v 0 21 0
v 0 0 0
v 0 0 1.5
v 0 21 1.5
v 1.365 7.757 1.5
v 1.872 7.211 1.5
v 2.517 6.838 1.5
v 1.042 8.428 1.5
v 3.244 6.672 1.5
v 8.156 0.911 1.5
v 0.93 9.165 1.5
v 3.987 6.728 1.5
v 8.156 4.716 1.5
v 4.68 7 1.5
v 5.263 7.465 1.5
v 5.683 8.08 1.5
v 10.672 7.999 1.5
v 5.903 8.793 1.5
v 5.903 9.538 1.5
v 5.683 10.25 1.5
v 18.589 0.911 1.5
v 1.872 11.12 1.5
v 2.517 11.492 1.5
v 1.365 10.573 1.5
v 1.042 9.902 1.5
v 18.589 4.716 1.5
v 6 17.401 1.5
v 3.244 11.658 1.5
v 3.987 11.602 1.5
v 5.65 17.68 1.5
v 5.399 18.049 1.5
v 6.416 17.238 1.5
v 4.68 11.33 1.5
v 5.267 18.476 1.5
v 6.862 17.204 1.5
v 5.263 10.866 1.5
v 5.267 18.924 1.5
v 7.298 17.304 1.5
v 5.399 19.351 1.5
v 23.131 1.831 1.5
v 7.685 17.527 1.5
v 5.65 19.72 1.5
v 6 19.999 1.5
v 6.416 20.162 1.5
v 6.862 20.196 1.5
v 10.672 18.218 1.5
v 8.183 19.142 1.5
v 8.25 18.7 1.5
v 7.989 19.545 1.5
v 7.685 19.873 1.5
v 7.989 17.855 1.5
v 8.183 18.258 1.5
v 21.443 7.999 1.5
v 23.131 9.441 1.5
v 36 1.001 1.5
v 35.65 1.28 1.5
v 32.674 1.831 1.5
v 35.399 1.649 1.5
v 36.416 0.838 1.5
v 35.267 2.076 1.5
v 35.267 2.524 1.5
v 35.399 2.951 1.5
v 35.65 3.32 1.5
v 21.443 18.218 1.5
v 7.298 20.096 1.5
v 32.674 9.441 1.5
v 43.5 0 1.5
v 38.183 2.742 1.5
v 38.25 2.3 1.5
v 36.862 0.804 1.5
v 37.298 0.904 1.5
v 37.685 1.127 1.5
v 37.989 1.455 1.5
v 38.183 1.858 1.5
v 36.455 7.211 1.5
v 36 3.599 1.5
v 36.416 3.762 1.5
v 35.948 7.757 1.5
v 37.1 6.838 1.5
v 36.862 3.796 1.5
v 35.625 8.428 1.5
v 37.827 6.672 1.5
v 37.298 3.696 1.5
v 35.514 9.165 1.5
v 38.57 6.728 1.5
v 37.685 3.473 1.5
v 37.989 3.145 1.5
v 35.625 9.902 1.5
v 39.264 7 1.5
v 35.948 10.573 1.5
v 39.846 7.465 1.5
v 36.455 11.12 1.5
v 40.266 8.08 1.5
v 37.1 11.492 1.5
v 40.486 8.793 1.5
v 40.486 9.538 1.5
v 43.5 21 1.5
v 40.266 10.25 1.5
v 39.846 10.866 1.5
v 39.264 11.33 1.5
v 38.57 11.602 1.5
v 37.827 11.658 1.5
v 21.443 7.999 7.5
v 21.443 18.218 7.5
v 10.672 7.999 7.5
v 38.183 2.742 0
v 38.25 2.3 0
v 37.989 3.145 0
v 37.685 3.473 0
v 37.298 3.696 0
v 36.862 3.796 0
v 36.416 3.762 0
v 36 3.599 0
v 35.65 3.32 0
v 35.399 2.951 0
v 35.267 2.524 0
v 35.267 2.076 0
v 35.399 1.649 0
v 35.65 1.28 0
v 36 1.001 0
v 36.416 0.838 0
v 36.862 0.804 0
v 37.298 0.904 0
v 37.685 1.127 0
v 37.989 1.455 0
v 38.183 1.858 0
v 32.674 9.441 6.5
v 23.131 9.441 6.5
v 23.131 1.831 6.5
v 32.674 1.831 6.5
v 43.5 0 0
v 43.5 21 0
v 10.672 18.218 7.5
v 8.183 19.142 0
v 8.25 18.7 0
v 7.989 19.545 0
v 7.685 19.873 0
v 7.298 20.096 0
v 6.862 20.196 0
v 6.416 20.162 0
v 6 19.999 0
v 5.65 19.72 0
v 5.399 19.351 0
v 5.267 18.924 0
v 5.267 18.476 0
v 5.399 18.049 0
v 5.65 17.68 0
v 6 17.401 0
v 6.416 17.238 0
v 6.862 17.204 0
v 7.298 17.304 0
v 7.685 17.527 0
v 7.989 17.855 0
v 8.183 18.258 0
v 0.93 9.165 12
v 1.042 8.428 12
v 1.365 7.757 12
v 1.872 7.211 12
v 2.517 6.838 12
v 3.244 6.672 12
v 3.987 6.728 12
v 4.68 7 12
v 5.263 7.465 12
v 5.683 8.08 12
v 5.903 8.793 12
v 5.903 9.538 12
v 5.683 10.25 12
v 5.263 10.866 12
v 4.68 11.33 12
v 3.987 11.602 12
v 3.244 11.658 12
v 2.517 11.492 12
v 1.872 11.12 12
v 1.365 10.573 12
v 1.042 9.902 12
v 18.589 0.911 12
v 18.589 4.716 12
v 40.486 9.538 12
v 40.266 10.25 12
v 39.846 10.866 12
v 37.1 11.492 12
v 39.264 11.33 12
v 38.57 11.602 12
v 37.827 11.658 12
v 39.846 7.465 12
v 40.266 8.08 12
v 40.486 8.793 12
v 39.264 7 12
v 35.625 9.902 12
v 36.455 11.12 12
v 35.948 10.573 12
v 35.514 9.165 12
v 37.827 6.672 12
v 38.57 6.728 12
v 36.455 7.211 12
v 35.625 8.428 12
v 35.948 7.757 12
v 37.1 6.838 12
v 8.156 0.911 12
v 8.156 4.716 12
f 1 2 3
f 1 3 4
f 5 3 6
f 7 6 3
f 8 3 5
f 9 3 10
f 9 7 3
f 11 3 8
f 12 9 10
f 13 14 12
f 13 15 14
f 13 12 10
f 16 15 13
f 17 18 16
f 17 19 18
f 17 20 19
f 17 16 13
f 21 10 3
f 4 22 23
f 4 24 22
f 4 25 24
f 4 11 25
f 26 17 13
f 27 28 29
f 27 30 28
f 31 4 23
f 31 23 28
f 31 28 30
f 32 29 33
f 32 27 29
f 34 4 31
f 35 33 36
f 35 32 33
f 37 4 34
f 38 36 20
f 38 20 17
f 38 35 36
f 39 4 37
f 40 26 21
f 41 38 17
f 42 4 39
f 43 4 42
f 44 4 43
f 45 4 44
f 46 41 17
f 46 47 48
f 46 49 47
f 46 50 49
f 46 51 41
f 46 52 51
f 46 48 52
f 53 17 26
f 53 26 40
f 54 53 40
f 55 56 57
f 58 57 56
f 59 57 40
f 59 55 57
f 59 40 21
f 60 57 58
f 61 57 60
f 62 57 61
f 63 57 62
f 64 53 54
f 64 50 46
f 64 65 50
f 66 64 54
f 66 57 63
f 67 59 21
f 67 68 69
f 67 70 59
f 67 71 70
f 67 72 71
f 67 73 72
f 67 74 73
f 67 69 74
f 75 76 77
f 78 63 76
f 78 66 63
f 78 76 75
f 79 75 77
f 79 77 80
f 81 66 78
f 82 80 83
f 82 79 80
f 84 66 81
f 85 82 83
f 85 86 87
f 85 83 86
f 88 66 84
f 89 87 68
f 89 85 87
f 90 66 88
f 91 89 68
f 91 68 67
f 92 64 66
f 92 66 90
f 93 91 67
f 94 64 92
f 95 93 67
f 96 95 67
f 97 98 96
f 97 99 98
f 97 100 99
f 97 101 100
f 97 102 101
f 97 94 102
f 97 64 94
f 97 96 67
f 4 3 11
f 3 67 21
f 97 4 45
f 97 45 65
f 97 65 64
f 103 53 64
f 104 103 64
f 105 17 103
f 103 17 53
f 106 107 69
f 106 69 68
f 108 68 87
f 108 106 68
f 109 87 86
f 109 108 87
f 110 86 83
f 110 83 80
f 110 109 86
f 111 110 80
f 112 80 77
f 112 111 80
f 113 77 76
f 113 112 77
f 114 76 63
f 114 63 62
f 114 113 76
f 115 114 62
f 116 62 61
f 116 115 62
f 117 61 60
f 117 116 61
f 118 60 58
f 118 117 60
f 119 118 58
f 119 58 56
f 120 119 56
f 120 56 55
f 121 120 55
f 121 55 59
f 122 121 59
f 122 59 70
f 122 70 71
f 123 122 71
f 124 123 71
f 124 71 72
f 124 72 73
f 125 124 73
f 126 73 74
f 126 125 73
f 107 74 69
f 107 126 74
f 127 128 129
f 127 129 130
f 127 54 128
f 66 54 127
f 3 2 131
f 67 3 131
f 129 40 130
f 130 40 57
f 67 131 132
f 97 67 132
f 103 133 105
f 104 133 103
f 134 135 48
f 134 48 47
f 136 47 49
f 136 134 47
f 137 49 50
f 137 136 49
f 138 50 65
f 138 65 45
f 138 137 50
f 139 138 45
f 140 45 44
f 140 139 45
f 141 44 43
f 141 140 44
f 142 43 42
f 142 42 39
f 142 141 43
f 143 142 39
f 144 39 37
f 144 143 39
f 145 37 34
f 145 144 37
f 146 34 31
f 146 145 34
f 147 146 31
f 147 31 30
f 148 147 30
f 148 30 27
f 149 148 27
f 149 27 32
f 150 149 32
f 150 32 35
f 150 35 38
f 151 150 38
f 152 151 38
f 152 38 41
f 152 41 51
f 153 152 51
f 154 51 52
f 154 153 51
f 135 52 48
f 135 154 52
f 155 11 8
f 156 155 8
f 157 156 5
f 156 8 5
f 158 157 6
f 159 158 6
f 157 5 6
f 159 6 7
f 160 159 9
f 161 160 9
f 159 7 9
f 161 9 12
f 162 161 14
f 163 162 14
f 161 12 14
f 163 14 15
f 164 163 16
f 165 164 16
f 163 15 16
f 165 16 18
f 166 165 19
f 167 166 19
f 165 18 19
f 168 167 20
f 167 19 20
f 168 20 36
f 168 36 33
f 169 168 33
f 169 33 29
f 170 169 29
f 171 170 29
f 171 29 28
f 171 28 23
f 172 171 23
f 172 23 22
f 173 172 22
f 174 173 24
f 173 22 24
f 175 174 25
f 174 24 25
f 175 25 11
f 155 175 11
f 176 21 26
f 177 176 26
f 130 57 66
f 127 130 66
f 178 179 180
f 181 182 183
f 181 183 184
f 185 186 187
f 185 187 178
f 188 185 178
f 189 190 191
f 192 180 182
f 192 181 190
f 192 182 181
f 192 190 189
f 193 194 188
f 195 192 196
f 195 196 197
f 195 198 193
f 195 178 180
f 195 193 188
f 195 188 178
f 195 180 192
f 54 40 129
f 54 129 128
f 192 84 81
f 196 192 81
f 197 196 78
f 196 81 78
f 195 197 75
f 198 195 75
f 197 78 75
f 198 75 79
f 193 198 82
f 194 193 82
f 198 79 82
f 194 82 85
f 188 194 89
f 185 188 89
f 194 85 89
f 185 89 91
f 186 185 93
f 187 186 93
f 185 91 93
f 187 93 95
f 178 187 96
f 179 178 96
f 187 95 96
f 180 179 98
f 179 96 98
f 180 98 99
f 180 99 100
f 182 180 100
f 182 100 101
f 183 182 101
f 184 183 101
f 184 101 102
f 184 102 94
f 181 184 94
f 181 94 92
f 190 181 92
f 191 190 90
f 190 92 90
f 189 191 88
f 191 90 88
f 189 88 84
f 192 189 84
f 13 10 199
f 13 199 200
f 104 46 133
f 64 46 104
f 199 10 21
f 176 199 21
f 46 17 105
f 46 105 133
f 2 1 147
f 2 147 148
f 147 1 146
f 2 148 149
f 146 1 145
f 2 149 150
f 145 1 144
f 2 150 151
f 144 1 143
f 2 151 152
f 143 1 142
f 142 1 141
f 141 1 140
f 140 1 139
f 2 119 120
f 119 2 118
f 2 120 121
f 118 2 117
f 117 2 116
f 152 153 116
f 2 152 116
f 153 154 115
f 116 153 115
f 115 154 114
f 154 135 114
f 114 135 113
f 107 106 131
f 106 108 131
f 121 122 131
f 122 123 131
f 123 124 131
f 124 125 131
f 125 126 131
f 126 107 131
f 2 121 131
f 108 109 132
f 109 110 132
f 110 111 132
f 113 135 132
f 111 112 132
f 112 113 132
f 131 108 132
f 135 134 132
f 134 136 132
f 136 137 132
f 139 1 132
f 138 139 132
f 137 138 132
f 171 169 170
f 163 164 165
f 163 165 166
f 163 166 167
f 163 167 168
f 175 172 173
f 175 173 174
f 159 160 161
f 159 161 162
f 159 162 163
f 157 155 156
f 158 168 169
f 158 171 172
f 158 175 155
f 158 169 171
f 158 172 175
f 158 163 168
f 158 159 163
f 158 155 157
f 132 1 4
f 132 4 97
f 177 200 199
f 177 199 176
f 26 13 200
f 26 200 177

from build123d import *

# Parameters (mm, degrees)
SKETCH1_W           = 43.5
SKETCH1_H           = 21
SKETCH1_R           = 1.5
BOSS_EXTRUDE1_DEPTH = 1.5
SKETCH2_R           = 2.5
SKETCH2_W           = 10.433244148
SKETCH2_H           = 3.805065513
BOSS_EXTRUDE2_DEPTH = 10.5
SKETCH3_W           = 10.770790281
SKETCH3_H           = 10.218442062
BOSS_EXTRUDE3_DEPTH = 6
SKETCH4_W           = 9.543349793
SKETCH4_H           = 7.610131025
BOSS_EXTRUDE4_DEPTH = 5


with BuildPart() as part:
    # Sketch1 → Boss-Extrude1 (new body)
    with BuildSketch(Plane.XY):
        with Locations((21.75, 10.5)):
            Rectangle(SKETCH1_W, SKETCH1_H)
        with Locations((6.75, 18.7)):
            Circle(SKETCH1_R, mode=Mode.SUBTRACT)
        with Locations((36.75, 2.3)):
            Circle(SKETCH1_R, mode=Mode.SUBTRACT)
    extrude(amount=BOSS_EXTRUDE1_DEPTH)

    # Sketch2 → Boss-Extrude2 (add)
    with BuildSketch(Plane.XY.offset(1.5)):
        with Locations(Location((3.430450718, 9.165158469, 0), (0, 0, 180))):
            Circle(SKETCH2_R)
        with Locations(Location((38.013586465, 9.165158469, 0), (0, 0, 180))):
            Circle(SKETCH2_R)
        with Locations((13.37271867, 2.813153945)):
            Rectangle(SKETCH2_W, SKETCH2_H)
    extrude(amount=BOSS_EXTRUDE2_DEPTH)

    # Sketch3 → Boss-Extrude3 (add)
    with BuildSketch(Plane.XY.offset(1.5)):
        with Locations((16.057744738, 13.108311037)):
            Rectangle(SKETCH3_W, SKETCH3_H)
    extrude(amount=BOSS_EXTRUDE3_DEPTH)

    # Sketch4 → Boss-Extrude4 (add)
    with BuildSketch(Plane.XY.offset(1.5)):
        with Locations((27.902545446, 5.636267067)):
            Rectangle(SKETCH4_W, SKETCH4_H)
    extrude(amount=BOSS_EXTRUDE4_DEPTH)


solid = part.part
